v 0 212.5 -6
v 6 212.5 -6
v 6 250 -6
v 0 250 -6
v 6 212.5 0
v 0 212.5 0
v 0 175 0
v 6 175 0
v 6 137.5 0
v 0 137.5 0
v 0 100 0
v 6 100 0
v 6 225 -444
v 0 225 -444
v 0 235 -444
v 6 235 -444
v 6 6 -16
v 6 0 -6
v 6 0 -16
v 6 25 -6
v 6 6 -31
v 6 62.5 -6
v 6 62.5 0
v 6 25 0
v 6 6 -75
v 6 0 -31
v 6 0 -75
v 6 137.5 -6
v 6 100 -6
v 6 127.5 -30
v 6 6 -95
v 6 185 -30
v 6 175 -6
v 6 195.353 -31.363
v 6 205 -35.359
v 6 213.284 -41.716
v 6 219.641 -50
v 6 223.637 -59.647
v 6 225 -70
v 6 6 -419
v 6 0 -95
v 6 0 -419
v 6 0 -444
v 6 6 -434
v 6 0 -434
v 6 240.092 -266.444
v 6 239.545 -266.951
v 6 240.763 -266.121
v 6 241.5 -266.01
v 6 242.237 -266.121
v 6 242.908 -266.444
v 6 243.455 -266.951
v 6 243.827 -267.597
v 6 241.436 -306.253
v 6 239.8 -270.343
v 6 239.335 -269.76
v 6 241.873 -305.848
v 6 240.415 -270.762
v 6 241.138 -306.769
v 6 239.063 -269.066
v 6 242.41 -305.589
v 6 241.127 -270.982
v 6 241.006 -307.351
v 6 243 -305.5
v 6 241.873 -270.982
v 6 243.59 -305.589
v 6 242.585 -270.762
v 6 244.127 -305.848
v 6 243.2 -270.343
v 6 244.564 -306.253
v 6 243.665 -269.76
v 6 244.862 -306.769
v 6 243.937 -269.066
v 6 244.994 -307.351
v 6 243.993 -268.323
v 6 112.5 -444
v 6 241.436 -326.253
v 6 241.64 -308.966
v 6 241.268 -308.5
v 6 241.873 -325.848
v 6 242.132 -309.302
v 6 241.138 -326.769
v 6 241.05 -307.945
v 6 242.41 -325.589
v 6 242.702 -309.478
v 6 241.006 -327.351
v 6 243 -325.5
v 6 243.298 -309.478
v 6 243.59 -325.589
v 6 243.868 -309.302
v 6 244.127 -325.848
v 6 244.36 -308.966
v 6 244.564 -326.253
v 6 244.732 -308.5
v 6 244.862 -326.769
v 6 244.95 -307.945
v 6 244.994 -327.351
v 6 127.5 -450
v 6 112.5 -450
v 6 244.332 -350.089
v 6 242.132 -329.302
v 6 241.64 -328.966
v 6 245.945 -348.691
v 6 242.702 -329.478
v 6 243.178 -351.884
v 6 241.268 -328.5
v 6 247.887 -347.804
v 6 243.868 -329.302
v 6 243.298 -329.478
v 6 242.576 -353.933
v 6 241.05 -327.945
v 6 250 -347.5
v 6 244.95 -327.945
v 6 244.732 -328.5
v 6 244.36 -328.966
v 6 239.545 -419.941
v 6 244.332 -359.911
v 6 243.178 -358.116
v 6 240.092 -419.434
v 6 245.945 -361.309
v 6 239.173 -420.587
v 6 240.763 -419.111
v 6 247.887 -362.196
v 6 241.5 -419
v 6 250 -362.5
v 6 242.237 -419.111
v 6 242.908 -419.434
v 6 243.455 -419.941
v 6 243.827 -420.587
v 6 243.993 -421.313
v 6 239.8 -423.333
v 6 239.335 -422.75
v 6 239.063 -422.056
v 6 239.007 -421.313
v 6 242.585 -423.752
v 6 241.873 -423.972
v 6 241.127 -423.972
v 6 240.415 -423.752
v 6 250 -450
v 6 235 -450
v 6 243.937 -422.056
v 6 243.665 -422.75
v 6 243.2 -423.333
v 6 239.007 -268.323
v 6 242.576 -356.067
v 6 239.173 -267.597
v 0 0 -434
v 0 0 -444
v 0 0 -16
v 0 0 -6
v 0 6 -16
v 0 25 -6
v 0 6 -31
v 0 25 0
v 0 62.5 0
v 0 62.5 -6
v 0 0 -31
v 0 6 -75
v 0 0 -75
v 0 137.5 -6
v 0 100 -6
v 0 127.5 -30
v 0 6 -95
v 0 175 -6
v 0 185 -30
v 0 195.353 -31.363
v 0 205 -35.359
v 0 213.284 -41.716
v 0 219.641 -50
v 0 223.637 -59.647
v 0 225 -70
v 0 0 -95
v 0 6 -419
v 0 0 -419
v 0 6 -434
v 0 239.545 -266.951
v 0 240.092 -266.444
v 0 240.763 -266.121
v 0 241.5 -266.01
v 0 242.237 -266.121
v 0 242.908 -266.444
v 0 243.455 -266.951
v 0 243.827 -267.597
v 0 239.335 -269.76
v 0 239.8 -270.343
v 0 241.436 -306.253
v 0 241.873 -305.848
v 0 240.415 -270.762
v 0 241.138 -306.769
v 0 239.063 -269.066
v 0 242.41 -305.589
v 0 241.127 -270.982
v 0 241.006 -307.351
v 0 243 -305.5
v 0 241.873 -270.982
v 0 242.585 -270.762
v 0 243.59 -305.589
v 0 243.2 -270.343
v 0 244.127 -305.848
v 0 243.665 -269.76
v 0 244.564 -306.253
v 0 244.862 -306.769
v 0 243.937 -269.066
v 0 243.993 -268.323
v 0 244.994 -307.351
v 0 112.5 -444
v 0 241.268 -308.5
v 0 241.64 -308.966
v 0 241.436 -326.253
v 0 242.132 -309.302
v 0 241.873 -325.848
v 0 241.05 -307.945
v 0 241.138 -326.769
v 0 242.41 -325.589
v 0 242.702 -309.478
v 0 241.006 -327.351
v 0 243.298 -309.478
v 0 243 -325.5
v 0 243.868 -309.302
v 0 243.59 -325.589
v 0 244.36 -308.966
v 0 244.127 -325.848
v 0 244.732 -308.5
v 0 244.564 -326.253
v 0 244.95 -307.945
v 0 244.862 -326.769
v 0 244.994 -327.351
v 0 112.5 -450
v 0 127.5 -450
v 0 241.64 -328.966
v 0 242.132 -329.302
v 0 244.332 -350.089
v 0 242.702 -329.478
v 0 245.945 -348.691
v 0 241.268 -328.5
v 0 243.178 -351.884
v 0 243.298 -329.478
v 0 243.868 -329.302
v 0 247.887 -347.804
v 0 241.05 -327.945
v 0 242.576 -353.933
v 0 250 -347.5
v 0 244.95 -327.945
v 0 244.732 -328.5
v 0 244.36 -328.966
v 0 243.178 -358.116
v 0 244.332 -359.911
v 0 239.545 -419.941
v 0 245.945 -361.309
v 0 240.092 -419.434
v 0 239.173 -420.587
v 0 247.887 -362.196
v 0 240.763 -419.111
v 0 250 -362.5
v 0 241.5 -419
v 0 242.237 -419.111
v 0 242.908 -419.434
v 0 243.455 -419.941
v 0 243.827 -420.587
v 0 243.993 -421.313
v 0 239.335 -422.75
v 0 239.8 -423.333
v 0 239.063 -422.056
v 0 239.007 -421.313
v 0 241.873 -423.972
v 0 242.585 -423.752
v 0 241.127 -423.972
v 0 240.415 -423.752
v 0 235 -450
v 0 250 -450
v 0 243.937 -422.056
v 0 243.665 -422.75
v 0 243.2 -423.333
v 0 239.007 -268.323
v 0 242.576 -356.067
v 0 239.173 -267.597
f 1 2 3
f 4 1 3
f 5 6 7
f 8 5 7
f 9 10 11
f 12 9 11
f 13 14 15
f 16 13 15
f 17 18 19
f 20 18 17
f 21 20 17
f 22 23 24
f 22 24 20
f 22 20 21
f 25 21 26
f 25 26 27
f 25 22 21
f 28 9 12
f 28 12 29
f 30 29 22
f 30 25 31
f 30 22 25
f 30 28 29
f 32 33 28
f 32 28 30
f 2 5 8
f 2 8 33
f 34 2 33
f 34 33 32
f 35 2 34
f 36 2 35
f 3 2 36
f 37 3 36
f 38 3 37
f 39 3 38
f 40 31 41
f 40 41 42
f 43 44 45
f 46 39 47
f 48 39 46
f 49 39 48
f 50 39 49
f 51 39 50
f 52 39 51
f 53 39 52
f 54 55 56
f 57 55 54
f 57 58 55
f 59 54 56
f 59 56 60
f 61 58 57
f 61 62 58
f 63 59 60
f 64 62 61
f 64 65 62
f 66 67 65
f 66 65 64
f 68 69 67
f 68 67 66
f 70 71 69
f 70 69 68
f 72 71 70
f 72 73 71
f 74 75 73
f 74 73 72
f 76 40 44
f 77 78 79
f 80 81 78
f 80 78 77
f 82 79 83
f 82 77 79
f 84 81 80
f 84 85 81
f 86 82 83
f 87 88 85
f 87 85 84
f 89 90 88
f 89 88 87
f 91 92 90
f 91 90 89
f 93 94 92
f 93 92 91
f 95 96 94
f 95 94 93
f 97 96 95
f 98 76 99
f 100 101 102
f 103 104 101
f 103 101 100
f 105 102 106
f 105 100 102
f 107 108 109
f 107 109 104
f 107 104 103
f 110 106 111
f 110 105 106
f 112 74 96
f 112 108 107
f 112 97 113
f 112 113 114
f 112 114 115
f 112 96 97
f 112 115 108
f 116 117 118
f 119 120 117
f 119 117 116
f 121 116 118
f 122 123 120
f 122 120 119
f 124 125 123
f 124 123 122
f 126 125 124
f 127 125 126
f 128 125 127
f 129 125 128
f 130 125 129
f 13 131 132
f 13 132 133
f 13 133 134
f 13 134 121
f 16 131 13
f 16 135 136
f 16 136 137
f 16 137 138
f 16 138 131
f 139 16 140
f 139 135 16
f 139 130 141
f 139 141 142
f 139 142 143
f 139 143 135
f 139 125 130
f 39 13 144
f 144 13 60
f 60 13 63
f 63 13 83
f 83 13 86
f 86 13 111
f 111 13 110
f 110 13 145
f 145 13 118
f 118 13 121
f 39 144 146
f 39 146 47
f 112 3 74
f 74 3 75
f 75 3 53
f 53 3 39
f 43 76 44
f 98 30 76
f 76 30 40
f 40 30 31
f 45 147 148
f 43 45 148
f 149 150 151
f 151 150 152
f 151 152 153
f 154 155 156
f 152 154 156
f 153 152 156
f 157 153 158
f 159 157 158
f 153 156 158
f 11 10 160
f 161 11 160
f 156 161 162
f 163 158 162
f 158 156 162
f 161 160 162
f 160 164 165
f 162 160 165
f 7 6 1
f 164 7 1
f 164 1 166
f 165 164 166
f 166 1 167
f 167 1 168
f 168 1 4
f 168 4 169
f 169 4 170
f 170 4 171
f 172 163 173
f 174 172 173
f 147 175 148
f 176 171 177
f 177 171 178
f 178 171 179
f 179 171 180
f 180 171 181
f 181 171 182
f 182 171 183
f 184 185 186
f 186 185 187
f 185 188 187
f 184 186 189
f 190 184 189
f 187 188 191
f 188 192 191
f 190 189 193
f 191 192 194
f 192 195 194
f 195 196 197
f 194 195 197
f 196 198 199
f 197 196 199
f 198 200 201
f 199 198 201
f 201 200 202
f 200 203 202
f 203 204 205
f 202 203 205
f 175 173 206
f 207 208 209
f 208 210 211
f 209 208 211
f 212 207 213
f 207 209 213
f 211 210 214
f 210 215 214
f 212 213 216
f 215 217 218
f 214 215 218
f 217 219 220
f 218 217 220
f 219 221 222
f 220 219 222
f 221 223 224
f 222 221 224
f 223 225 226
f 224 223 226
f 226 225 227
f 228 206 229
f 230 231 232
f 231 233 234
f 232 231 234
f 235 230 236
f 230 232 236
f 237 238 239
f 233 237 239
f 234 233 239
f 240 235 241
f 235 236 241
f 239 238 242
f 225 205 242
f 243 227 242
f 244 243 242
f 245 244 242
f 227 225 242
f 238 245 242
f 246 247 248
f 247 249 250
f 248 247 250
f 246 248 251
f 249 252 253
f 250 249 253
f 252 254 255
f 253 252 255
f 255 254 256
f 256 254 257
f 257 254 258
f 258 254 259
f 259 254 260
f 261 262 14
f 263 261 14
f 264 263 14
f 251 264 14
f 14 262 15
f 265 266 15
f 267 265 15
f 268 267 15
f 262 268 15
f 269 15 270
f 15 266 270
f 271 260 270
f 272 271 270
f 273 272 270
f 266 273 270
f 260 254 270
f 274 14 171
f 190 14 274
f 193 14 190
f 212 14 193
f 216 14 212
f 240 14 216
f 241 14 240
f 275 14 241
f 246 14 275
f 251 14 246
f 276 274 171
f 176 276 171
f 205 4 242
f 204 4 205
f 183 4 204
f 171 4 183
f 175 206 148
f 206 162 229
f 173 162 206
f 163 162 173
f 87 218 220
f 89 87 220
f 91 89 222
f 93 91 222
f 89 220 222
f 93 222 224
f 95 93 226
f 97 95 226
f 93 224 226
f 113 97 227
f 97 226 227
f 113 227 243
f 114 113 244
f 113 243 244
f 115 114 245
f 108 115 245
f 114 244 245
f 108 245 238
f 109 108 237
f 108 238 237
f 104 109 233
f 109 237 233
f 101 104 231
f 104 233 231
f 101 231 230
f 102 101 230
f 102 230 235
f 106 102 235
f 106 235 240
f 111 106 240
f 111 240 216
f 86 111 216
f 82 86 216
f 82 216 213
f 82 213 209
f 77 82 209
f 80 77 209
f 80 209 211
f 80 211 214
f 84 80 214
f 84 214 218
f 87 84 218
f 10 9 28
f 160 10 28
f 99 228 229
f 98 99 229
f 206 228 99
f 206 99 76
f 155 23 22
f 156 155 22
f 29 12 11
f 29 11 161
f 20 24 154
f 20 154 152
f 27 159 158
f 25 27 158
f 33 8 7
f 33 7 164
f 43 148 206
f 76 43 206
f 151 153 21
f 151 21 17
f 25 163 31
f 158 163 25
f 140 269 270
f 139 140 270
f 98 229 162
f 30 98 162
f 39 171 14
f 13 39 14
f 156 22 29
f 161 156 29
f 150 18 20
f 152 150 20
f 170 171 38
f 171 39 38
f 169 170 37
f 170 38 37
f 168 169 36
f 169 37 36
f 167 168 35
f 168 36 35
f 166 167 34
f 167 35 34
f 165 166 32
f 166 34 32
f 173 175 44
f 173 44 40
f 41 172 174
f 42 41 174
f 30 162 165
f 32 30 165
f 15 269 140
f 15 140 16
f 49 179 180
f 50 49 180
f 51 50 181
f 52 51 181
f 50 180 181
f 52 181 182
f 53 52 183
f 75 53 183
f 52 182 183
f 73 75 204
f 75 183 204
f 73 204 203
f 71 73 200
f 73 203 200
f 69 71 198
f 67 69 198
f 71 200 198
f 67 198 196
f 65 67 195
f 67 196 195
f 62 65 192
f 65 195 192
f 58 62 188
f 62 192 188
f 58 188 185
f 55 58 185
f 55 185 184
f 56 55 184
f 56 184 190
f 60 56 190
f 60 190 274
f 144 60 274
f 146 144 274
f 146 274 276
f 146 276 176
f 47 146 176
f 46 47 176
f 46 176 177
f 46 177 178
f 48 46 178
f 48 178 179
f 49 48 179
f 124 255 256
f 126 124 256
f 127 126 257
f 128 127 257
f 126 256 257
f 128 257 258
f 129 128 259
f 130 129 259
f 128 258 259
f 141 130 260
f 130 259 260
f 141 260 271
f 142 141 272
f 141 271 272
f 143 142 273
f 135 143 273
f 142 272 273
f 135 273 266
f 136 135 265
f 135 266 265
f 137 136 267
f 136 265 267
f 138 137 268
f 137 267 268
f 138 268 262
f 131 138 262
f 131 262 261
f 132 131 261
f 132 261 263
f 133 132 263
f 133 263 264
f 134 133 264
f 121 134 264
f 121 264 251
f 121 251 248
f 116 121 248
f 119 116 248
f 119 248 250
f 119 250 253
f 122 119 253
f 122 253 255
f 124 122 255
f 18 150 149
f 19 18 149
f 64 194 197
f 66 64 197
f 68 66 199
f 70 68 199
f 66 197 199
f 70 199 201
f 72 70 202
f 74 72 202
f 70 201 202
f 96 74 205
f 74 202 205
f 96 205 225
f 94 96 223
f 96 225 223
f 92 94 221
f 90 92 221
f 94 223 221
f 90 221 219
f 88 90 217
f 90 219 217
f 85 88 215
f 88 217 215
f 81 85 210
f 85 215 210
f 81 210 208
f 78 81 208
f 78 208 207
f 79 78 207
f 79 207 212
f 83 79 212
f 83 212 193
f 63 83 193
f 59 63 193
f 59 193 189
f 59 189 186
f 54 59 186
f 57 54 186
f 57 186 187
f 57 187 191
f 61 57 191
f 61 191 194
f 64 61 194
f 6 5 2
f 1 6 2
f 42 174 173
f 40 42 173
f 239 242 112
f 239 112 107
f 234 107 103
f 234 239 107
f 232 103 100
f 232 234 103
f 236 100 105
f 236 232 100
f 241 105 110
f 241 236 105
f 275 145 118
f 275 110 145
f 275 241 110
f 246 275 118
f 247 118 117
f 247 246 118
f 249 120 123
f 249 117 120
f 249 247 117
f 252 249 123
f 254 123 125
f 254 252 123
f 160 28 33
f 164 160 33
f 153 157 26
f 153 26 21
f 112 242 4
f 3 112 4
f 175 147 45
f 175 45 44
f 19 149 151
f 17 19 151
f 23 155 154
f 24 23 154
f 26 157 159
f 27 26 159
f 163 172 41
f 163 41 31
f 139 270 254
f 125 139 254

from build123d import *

# Parameters (mm, degrees)
BOSS_EXTRUDE1_DEPTH = 6
SKETCH2_W           = 6
SKETCH2_H           = 37.5
CUT_EXTRUDE1_DEPTH  = 6
LPATTERN1_COUNT     = 4
LPATTERN1_PITCH     = 75
FILLET1_R           = 40
SKETCH3_W           = 6
SKETCH3_H           = 10
SKETCH3_H_2         = 112.5
CUT_EXTRUDE2_DEPTH  = 515.816472153
SKETCH4_W           = 15
SKETCH4_H           = 6
CUT_EXTRUDE3_DEPTH  = 515.816472153
SKETCH5_R           = 2
CUT_EXTRUDE4_DEPTH  = 515.816472153
SKETCH6_W           = 20
SKETCH6_H           = 6
CUT_EXTRUDE5_DEPTH  = 515.816472153
SKETCH7_R           = 2.5
CUT_EXTRUDE6_DEPTH  = 515.816472153


with BuildPart() as part:
    # Sketch1 → Boss-Extrude1 (new body)
    with BuildSketch(Plane(origin=(0, 0, 0), x_dir=(0, 0, -1), z_dir=(1, 0, 0))):
        Polygon((450, 225), (450, 250), (0, 250), (0, 0), (450, 0), (450, 127.5), (30, 127.5), (30, 225), align=None)
    extrude(amount=BOSS_EXTRUDE1_DEPTH)

    # Sketch2 → Cut-Extrude1 (cut)
    with BuildSketch(Plane(origin=(6, 0, 0), x_dir=(0, 0, -1), z_dir=(1, 0, 0))):
        with Locations((3, 231.25)):
            Rectangle(SKETCH2_W, SKETCH2_H)
    cut_extrude1 = extrude(amount=-CUT_EXTRUDE1_DEPTH, mode=Mode.SUBTRACT)

    # LPattern1: Cut-Extrude1 ×4
    with Locations(*[(0, -i * LPATTERN1_PITCH, 0) for i in range(1, LPATTERN1_COUNT)]):
        add(cut_extrude1, mode=Mode.SUBTRACT)

    # Fillet1
    fillet1_edges = [part.edges().sort_by_distance(p)[0] for p in [
        (3, 225, -30),
    ]]
    fillet(fillet1_edges, radius=FILLET1_R)

    # Sketch3 → Cut-Extrude2 (cut, through all)
    with BuildSketch(Plane.ZY):
        with Locations((-447, 230)):
            Rectangle(SKETCH3_W, SKETCH3_H)
        with Locations((-447, 56.25)):
            Rectangle(SKETCH3_W, SKETCH3_H_2)
    extrude(amount=-CUT_EXTRUDE2_DEPTH, mode=Mode.SUBTRACT)

    # Sketch4 → Cut-Extrude3 (cut, through all)
    with BuildSketch(Plane.ZY):
        with Locations((-23.5, 3)):
            Rectangle(SKETCH4_W, SKETCH4_H)
        with Locations((-426.5, 3)):
            Rectangle(SKETCH4_W, SKETCH4_H)
    extrude(amount=-CUT_EXTRUDE3_DEPTH, mode=Mode.SUBTRACT)

    # Sketch5 → Cut-Extrude4 (cut, through all)
    with BuildSketch(Plane.ZY):
        with Locations((-327.5, 243)):
            Circle(SKETCH5_R)
        with Locations((-307.5, 243)):
            Circle(SKETCH5_R)
        with BuildLine():
            Line((-362.5, 250), (-347.5, 250))
            ThreePointArc((-347.5, 250), (-355, 242.5), (-362.5, 250))
        make_face()
    extrude(amount=-CUT_EXTRUDE4_DEPTH, mode=Mode.SUBTRACT)

    # Sketch6 → Cut-Extrude5 (cut, through all)
    with BuildSketch(Plane.ZY):
        with Locations((-85, 3)):
            Rectangle(SKETCH6_W, SKETCH6_H)
    extrude(amount=-CUT_EXTRUDE5_DEPTH, mode=Mode.SUBTRACT)

    # Sketch7 → Cut-Extrude6 (cut, through all)
    with BuildSketch(Plane.ZY):
        with Locations((-421.5, 241.5)):
            Circle(SKETCH7_R)
        with Locations((-268.51, 241.5)):
            Circle(SKETCH7_R)
    extrude(amount=-CUT_EXTRUDE6_DEPTH, mode=Mode.SUBTRACT)


solid = part.part
